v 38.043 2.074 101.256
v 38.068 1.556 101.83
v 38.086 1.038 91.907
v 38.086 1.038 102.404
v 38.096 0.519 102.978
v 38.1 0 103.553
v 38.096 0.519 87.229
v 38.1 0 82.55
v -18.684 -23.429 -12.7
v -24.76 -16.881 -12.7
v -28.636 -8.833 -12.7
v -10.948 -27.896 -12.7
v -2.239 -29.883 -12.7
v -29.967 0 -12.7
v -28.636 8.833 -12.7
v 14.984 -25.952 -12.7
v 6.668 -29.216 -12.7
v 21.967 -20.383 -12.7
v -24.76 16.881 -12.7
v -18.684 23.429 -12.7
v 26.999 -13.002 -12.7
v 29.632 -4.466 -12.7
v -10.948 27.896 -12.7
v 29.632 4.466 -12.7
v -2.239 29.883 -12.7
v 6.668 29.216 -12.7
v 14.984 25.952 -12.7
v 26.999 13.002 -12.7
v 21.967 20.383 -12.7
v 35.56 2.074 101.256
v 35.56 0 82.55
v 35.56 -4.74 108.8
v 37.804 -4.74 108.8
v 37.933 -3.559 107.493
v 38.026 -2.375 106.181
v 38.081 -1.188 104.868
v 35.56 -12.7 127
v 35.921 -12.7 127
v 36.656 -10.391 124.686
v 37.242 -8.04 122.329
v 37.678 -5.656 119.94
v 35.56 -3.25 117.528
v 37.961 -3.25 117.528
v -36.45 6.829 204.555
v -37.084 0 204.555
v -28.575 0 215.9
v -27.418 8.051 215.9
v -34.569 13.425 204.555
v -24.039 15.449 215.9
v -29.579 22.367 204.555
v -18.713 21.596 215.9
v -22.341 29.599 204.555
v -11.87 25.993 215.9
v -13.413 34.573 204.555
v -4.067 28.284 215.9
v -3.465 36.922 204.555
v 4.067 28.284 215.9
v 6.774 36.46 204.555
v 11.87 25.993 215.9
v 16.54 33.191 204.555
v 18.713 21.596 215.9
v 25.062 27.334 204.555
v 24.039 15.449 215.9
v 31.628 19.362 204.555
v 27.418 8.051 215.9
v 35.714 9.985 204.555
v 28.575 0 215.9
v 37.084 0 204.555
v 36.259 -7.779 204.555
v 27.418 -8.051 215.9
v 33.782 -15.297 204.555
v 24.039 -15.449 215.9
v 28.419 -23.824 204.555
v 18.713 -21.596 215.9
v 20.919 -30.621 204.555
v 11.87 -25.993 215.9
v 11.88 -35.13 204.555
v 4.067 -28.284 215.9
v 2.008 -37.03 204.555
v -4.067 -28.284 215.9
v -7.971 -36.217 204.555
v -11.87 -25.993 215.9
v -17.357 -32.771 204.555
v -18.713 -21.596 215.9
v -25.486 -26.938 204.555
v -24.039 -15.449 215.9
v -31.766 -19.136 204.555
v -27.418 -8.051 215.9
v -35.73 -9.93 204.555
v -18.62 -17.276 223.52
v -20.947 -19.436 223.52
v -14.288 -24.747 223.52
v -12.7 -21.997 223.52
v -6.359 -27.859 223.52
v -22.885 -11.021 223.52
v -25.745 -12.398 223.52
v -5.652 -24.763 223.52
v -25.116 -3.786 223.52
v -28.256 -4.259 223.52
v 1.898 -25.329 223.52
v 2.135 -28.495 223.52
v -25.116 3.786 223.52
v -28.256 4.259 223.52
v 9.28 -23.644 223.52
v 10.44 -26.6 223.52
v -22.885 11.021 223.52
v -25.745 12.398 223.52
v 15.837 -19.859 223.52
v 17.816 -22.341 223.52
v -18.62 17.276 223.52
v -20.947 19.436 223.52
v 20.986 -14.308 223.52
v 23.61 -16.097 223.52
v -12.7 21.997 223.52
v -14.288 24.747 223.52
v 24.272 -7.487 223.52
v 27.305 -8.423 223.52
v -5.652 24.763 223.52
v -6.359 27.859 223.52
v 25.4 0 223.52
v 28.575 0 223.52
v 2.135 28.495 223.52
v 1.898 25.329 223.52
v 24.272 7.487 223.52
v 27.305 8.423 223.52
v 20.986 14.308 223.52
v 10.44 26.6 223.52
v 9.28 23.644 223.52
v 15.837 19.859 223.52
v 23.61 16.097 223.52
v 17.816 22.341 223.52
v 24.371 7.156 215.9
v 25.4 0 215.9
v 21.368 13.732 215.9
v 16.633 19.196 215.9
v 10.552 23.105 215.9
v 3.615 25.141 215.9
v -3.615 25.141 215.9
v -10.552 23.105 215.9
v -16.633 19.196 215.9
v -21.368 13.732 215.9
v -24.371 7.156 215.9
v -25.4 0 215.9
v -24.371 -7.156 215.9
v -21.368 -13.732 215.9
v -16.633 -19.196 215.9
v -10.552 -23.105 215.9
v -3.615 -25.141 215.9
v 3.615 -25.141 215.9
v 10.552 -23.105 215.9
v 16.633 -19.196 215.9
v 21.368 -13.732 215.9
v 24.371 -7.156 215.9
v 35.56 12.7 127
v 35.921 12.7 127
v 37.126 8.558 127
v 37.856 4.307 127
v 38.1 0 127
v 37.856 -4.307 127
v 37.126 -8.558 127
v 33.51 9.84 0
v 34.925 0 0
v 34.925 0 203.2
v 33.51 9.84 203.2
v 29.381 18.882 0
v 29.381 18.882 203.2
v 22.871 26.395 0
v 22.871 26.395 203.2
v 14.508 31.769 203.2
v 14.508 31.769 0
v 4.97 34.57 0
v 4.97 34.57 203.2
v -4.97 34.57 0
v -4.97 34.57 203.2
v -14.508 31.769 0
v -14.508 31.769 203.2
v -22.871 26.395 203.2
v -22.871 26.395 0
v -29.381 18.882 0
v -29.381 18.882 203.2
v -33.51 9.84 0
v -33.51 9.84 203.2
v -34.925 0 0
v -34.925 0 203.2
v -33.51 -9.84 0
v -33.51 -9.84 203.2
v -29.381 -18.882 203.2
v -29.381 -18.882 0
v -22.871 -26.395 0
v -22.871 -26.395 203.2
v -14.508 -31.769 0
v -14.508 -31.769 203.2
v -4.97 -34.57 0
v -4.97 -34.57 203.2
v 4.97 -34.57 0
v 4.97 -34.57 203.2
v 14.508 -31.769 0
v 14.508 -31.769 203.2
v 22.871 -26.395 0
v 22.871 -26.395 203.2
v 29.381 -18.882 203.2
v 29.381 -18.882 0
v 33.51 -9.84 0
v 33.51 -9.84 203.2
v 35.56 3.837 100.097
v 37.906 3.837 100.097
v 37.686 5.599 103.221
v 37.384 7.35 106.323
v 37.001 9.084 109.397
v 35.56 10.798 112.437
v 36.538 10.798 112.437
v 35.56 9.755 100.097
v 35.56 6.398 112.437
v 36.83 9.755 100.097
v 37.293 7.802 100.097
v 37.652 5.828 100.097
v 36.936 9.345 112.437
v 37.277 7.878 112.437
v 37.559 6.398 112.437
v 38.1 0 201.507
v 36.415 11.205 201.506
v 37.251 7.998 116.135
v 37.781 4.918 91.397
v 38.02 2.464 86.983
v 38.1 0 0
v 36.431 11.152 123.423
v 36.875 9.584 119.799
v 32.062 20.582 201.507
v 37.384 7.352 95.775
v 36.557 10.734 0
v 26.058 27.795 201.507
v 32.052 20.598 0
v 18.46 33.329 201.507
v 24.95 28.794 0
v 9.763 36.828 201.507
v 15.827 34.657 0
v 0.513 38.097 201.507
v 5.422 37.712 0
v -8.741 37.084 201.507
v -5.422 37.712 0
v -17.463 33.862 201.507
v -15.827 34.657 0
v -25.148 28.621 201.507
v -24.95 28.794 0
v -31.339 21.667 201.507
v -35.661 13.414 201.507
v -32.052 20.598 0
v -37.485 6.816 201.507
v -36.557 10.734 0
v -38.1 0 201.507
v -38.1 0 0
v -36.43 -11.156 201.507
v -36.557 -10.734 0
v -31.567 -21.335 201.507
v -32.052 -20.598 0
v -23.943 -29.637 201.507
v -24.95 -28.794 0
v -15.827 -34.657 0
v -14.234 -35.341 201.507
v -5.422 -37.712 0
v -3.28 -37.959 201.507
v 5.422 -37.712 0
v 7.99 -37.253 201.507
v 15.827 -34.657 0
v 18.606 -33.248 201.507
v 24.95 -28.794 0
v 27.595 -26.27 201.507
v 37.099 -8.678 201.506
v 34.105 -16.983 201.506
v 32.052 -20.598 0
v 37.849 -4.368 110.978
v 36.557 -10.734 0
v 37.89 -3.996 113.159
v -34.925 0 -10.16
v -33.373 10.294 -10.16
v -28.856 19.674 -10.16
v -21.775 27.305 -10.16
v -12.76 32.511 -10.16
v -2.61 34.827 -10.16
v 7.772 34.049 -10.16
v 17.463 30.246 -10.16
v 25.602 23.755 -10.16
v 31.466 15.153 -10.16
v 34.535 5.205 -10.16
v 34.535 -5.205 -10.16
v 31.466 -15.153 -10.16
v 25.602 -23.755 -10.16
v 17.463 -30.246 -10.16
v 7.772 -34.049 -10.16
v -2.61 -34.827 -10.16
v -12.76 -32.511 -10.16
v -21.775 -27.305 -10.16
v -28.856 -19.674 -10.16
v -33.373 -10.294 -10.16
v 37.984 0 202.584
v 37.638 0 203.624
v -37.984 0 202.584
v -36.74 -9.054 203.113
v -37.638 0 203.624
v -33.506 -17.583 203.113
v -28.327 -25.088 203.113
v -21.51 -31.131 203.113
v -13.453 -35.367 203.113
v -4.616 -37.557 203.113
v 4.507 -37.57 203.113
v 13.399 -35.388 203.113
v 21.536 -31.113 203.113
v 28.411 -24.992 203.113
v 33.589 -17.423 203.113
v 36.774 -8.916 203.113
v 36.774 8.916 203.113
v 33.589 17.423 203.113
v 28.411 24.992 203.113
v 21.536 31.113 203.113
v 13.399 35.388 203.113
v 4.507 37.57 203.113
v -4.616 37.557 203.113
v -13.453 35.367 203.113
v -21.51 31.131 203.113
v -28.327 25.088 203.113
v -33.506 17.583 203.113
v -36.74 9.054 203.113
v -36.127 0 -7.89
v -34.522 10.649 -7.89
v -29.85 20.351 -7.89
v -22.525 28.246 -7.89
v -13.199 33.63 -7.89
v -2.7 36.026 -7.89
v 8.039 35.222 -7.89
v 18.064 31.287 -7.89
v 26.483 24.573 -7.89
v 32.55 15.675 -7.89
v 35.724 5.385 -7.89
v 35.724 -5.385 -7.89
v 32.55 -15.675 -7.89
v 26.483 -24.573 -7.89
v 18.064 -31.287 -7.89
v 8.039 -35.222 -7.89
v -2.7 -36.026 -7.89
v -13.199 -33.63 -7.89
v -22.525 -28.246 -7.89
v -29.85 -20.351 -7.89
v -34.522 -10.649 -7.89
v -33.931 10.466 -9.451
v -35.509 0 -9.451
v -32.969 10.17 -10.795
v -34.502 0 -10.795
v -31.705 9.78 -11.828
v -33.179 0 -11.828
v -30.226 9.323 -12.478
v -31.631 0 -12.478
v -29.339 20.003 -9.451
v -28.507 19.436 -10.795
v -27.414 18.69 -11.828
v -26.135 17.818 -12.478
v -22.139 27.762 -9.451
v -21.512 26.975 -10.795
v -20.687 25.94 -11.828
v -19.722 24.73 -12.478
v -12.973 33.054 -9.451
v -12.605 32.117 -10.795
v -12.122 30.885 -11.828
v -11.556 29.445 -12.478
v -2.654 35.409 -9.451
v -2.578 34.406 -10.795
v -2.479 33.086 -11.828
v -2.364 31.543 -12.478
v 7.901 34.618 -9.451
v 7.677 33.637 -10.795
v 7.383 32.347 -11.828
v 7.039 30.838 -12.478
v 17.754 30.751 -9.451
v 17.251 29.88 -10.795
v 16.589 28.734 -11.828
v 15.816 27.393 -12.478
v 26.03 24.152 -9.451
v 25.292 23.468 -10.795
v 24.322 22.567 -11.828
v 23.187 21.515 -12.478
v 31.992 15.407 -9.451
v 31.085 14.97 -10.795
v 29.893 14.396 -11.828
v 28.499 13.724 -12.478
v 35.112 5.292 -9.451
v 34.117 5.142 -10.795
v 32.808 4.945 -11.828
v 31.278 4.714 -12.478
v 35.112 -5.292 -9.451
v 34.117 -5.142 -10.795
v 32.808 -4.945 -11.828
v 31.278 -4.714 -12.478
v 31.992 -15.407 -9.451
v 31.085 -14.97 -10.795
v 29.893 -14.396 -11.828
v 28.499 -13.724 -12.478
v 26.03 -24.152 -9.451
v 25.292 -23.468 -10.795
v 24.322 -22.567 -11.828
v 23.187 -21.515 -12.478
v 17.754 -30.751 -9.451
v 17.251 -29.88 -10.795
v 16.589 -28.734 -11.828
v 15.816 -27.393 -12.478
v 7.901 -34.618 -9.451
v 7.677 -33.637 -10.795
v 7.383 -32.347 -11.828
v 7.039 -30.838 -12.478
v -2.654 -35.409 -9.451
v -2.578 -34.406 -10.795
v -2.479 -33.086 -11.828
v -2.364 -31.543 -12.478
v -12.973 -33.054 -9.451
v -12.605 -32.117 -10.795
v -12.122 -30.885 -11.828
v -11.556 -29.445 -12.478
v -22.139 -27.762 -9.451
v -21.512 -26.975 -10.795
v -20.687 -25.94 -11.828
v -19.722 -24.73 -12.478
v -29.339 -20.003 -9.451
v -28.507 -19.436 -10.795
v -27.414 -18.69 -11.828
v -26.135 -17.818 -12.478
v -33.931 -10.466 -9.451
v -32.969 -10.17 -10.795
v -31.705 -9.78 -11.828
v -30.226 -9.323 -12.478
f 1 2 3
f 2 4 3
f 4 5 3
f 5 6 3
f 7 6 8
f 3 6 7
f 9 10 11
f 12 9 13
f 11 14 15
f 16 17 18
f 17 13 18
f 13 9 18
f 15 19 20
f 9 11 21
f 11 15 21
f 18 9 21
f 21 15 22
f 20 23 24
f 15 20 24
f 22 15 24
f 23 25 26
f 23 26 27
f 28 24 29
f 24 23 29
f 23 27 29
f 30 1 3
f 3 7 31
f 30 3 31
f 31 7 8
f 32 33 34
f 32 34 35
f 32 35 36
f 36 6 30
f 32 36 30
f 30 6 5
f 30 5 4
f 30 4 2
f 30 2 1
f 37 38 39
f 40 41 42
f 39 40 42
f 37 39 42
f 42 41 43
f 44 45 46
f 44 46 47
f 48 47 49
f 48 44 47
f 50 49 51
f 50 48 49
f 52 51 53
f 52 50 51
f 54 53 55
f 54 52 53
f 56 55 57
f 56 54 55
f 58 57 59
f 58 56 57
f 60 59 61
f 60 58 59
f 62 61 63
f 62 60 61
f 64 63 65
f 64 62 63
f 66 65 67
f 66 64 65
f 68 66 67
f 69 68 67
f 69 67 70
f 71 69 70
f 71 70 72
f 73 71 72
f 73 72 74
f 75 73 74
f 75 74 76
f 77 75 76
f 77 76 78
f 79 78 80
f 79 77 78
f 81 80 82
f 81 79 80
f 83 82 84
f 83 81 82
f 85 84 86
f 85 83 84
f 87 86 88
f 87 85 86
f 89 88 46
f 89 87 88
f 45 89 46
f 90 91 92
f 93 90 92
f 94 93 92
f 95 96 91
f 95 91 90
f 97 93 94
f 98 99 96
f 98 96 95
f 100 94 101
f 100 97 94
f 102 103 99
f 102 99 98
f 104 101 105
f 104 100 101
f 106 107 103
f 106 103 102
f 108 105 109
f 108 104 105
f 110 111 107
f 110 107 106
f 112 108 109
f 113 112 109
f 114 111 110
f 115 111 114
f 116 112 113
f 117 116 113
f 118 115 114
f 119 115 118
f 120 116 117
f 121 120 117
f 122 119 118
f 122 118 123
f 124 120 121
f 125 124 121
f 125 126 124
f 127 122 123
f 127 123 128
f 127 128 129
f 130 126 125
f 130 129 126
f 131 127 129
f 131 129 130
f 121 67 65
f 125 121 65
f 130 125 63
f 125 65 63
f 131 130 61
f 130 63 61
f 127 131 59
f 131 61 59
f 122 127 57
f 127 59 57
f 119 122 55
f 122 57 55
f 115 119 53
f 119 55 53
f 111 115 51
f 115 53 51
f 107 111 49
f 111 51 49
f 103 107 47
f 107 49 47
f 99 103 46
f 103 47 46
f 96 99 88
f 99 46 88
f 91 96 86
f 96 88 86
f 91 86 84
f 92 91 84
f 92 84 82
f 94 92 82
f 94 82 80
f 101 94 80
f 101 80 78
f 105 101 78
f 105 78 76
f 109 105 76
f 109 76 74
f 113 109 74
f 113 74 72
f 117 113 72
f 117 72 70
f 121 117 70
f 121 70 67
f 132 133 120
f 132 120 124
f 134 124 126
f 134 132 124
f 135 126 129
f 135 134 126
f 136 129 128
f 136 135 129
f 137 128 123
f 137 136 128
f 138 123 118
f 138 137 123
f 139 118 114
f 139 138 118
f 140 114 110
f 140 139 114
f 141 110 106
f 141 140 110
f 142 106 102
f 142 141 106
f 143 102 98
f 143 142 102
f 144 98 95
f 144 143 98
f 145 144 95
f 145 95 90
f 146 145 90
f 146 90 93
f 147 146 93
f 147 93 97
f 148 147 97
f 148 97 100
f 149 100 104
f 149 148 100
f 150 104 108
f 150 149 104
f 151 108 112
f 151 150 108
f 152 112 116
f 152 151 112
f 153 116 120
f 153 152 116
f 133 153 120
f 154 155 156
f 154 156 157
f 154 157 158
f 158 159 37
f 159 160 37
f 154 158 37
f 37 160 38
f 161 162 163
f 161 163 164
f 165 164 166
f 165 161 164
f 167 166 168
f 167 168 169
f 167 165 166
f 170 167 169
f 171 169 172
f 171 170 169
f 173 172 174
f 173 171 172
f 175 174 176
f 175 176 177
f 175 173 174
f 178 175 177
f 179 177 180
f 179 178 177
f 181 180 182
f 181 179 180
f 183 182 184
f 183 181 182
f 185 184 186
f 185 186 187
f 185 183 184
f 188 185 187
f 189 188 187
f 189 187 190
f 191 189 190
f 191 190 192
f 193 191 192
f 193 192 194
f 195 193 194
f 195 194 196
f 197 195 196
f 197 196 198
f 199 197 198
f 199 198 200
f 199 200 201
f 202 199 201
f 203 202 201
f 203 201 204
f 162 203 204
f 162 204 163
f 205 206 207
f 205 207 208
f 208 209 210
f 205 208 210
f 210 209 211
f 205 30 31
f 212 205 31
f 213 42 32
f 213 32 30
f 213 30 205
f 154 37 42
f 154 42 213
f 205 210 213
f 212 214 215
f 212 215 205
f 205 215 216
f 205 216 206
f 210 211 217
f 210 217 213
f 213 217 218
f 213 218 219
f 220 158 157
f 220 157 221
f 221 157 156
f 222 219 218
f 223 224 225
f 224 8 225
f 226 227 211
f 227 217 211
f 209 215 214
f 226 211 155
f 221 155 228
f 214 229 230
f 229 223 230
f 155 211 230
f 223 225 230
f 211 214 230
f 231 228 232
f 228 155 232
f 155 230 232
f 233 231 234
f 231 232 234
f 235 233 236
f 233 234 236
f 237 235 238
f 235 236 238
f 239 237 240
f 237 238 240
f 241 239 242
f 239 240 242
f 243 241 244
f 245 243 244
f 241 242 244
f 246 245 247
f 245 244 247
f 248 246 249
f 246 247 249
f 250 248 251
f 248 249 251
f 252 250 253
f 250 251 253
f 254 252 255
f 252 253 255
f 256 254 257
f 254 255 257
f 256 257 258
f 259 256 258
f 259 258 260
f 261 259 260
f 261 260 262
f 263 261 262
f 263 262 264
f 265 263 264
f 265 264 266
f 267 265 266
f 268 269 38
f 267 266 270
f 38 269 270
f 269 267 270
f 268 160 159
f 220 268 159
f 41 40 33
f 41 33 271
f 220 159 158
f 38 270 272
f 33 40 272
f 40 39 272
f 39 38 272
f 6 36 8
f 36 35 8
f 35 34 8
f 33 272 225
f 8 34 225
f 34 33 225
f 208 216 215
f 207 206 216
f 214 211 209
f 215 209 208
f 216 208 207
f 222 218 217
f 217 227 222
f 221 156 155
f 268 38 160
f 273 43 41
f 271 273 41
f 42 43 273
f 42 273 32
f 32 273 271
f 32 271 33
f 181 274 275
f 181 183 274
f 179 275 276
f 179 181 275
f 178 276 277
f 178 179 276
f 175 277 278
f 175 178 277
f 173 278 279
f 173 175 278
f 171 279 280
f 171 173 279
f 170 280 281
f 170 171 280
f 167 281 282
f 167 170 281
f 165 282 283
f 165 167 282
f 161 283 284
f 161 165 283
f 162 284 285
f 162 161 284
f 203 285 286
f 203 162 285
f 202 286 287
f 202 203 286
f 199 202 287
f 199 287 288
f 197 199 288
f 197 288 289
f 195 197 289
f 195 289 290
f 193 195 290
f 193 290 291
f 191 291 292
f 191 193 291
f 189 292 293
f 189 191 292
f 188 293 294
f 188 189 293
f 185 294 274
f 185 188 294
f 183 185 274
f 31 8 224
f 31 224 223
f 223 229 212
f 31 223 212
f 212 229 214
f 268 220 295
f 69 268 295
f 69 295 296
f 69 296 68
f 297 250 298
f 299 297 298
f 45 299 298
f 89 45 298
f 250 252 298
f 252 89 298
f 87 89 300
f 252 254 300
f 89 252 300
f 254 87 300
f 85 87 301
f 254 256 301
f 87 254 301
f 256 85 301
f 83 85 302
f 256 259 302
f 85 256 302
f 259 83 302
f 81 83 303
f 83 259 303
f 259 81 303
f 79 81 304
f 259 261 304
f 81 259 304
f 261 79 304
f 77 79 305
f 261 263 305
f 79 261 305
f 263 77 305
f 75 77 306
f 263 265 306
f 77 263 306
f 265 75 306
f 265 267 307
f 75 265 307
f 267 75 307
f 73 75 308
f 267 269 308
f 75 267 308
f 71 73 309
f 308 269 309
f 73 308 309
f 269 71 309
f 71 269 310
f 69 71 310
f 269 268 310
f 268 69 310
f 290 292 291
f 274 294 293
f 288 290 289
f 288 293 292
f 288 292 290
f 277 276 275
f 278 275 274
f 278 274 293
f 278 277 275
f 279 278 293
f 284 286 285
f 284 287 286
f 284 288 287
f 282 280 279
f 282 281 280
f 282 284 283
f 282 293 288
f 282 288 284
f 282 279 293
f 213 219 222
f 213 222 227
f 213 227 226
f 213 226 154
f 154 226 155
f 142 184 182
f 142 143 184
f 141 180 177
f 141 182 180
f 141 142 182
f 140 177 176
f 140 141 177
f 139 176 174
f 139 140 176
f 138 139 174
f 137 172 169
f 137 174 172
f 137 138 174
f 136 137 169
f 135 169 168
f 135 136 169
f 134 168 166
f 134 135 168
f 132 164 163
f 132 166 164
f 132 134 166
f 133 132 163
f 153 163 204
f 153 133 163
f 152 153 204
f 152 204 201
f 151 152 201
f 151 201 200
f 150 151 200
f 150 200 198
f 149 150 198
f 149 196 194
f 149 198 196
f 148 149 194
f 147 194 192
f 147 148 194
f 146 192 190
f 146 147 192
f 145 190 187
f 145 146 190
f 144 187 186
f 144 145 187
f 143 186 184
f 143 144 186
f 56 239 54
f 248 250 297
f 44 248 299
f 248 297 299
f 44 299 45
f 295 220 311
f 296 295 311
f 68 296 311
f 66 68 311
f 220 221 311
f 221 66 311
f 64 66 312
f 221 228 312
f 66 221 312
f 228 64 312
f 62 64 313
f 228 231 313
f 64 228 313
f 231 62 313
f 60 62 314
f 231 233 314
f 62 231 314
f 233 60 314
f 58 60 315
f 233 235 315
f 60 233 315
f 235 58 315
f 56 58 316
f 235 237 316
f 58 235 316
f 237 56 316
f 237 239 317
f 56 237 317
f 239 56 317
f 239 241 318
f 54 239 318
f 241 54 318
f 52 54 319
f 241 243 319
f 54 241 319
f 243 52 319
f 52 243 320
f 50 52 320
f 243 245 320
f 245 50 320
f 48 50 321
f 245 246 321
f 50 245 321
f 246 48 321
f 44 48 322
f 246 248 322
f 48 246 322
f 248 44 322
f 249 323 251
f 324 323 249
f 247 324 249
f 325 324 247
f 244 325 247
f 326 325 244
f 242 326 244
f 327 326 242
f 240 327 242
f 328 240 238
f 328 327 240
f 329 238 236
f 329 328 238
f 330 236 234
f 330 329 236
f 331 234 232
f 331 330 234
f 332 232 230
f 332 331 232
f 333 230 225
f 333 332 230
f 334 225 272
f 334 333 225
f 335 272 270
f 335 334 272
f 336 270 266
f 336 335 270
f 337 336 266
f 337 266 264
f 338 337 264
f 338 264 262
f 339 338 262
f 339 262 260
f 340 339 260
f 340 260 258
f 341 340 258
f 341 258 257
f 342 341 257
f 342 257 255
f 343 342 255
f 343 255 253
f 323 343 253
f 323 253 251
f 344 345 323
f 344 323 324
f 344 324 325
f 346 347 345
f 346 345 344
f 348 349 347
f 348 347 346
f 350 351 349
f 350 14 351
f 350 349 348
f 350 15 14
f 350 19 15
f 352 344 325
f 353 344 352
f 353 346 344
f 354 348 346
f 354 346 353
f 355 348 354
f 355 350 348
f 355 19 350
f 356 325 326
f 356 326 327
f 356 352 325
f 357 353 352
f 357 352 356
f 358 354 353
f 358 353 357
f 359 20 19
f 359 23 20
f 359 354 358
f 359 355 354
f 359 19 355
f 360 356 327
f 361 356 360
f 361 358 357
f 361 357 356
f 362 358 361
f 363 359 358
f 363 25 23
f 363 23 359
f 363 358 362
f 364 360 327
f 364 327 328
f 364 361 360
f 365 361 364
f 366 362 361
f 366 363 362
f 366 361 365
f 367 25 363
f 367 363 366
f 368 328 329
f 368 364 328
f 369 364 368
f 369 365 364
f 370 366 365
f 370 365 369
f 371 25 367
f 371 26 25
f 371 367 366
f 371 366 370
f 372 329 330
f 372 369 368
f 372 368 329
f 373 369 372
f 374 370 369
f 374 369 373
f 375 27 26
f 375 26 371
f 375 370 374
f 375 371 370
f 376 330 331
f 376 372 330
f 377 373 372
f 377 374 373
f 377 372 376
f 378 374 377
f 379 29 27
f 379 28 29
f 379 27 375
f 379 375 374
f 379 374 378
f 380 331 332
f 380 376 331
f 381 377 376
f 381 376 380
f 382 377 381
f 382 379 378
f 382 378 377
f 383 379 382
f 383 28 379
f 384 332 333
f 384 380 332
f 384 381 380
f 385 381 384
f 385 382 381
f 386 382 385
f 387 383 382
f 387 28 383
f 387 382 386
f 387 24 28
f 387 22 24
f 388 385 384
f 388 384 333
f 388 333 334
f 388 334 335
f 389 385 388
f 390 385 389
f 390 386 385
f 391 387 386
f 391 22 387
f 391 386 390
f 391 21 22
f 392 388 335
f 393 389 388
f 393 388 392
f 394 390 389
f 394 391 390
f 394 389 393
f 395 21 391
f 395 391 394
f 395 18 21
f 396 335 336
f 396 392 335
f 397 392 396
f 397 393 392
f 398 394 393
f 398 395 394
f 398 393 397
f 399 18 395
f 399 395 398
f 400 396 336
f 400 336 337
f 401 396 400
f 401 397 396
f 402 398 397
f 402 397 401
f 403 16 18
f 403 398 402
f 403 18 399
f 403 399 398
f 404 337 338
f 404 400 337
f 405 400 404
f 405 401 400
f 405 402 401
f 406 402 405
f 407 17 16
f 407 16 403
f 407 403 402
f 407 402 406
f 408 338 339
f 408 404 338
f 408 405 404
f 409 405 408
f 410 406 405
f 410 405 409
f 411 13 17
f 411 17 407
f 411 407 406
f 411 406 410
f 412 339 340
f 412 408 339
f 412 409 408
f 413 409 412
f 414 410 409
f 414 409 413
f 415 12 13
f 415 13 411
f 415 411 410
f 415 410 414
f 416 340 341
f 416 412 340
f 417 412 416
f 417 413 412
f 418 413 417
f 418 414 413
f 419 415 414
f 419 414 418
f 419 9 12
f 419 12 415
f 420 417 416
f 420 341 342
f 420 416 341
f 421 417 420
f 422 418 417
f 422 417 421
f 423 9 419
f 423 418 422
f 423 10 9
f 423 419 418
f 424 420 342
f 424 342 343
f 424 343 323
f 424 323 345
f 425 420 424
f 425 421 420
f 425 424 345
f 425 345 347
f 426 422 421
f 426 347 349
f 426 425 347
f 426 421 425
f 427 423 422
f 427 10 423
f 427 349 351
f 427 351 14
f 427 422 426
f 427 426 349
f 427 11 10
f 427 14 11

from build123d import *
from build123d import SkipClean  # not in build123d's __all__

# Parameters (mm, degrees)
F0_R      = 38.1
F0_R_2    = 34.925
F1_DEPTH  = 203.2
F3_R      = 34.925
F7_DEPTH  = 2.54
F9_R      = 28.575
F13_DEPTH = 7.62
F10_R     = 25.4
F14_DEPTH = 25.4
F15_R     = 6.35
F16_R     = 5.08
F19_DEPTH = 2.54


with BuildPart() as f1:
    # F0 (on Top) → F1 (new body)
    with BuildSketch(Plane.XY):
        Circle(F0_R)
        Circle(F0_R_2, mode=Mode.SUBTRACT)
    extrude(amount=F1_DEPTH)

    # F4 (on Front) → F6 (revolve)
    with BuildSketch(Plane.XZ):
        Polygon((-38.1, 0), (-34.925, -12.7), (-34.925, 0), align=None)
    revolve(axis=Axis((0, 0, -6.35), (0, 0, -1)))

    # F3 (on offset) → F7 (join)
    with BuildSketch(Plane.XY.offset(-12.7)):
        Circle(F3_R)
    extrude(amount=F7_DEPTH)

    # F11 (on Front) → F12 (revolve)
    with BuildSketch(Plane.XZ):
        Polygon((-25.4, 215.9), (-28.575, 215.9), (-38.1, 203.2), (-34.925, 203.2), align=None)
    revolve(axis=Axis((0, 0, 209.55), (0, 0, -1)))

    # F9 (on offset) → F13 (join)
    with BuildSketch(Plane.XY.offset(215.9)):
        Circle(F9_R)
    extrude(amount=F13_DEPTH)

    # F10 (on offset) → F14 (cut)
    with BuildSketch(Plane.XY.offset(215.9)):
        Circle(F10_R)
    extrude(amount=F14_DEPTH, mode=Mode.SUBTRACT)

    # F15
    f15_edges = [f1.edges().sort_by_distance(p)[0] for p in [
        (34.925, 0, -12.7),
    ]]
    fillet(f15_edges, radius=F15_R)

    # F16
    f16_edges = [f1.edges().sort_by_distance(p)[0] for p in [
        (0, -38.1, 203.2),
        (0, 38.1, 203.2),
    ]]
    fillet(f16_edges, radius=F16_R)

    # F18 (on offset) → F19 (cut)
    with BuildSketch(Plane.YZ.offset(38.1)):
        Polygon((0, 127), (-12.7, 127), (-3.2499410816, 117.5278012156), (-4.7398322865, 108.8000346422), (2.0743066773, 101.2560684681), (0, 82.55), (9.75460466, 100.0966164947), (3.8371453993, 100.0966164947), (10.7981534675, 112.4366257071), (6.3976268284, 112.4366257071), (12.7, 127), align=None)
    with SkipClean():  # cleaning this boolean's faces spoils the solid; the shape is the same uncleaned
        extrude(amount=-F19_DEPTH, mode=Mode.SUBTRACT)


solid = f1.part
